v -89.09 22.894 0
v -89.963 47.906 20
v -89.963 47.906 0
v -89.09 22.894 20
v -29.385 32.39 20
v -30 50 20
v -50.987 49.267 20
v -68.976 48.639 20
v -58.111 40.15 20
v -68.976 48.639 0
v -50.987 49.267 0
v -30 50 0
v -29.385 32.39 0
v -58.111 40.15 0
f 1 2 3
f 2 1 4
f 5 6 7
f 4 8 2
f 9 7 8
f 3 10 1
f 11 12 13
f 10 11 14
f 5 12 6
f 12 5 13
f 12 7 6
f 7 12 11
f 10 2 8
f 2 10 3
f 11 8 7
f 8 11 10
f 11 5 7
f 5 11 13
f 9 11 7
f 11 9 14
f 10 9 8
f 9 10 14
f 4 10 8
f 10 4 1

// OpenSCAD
translate([-30,50,0])
scale([3,3,1])
rotate([0,0,+182]) {
    difference() {
        cube([20, 20, 20]);
        translate([7, 0, -1]) {
            rotate([0,0,50]) {
                cube([30, 30, 30]);
            }
        }
        translate([13, 0, -1]) {
            rotate([0,0,50]) {
                cube([30, 30, 30]);
            }
        }
    }
}
